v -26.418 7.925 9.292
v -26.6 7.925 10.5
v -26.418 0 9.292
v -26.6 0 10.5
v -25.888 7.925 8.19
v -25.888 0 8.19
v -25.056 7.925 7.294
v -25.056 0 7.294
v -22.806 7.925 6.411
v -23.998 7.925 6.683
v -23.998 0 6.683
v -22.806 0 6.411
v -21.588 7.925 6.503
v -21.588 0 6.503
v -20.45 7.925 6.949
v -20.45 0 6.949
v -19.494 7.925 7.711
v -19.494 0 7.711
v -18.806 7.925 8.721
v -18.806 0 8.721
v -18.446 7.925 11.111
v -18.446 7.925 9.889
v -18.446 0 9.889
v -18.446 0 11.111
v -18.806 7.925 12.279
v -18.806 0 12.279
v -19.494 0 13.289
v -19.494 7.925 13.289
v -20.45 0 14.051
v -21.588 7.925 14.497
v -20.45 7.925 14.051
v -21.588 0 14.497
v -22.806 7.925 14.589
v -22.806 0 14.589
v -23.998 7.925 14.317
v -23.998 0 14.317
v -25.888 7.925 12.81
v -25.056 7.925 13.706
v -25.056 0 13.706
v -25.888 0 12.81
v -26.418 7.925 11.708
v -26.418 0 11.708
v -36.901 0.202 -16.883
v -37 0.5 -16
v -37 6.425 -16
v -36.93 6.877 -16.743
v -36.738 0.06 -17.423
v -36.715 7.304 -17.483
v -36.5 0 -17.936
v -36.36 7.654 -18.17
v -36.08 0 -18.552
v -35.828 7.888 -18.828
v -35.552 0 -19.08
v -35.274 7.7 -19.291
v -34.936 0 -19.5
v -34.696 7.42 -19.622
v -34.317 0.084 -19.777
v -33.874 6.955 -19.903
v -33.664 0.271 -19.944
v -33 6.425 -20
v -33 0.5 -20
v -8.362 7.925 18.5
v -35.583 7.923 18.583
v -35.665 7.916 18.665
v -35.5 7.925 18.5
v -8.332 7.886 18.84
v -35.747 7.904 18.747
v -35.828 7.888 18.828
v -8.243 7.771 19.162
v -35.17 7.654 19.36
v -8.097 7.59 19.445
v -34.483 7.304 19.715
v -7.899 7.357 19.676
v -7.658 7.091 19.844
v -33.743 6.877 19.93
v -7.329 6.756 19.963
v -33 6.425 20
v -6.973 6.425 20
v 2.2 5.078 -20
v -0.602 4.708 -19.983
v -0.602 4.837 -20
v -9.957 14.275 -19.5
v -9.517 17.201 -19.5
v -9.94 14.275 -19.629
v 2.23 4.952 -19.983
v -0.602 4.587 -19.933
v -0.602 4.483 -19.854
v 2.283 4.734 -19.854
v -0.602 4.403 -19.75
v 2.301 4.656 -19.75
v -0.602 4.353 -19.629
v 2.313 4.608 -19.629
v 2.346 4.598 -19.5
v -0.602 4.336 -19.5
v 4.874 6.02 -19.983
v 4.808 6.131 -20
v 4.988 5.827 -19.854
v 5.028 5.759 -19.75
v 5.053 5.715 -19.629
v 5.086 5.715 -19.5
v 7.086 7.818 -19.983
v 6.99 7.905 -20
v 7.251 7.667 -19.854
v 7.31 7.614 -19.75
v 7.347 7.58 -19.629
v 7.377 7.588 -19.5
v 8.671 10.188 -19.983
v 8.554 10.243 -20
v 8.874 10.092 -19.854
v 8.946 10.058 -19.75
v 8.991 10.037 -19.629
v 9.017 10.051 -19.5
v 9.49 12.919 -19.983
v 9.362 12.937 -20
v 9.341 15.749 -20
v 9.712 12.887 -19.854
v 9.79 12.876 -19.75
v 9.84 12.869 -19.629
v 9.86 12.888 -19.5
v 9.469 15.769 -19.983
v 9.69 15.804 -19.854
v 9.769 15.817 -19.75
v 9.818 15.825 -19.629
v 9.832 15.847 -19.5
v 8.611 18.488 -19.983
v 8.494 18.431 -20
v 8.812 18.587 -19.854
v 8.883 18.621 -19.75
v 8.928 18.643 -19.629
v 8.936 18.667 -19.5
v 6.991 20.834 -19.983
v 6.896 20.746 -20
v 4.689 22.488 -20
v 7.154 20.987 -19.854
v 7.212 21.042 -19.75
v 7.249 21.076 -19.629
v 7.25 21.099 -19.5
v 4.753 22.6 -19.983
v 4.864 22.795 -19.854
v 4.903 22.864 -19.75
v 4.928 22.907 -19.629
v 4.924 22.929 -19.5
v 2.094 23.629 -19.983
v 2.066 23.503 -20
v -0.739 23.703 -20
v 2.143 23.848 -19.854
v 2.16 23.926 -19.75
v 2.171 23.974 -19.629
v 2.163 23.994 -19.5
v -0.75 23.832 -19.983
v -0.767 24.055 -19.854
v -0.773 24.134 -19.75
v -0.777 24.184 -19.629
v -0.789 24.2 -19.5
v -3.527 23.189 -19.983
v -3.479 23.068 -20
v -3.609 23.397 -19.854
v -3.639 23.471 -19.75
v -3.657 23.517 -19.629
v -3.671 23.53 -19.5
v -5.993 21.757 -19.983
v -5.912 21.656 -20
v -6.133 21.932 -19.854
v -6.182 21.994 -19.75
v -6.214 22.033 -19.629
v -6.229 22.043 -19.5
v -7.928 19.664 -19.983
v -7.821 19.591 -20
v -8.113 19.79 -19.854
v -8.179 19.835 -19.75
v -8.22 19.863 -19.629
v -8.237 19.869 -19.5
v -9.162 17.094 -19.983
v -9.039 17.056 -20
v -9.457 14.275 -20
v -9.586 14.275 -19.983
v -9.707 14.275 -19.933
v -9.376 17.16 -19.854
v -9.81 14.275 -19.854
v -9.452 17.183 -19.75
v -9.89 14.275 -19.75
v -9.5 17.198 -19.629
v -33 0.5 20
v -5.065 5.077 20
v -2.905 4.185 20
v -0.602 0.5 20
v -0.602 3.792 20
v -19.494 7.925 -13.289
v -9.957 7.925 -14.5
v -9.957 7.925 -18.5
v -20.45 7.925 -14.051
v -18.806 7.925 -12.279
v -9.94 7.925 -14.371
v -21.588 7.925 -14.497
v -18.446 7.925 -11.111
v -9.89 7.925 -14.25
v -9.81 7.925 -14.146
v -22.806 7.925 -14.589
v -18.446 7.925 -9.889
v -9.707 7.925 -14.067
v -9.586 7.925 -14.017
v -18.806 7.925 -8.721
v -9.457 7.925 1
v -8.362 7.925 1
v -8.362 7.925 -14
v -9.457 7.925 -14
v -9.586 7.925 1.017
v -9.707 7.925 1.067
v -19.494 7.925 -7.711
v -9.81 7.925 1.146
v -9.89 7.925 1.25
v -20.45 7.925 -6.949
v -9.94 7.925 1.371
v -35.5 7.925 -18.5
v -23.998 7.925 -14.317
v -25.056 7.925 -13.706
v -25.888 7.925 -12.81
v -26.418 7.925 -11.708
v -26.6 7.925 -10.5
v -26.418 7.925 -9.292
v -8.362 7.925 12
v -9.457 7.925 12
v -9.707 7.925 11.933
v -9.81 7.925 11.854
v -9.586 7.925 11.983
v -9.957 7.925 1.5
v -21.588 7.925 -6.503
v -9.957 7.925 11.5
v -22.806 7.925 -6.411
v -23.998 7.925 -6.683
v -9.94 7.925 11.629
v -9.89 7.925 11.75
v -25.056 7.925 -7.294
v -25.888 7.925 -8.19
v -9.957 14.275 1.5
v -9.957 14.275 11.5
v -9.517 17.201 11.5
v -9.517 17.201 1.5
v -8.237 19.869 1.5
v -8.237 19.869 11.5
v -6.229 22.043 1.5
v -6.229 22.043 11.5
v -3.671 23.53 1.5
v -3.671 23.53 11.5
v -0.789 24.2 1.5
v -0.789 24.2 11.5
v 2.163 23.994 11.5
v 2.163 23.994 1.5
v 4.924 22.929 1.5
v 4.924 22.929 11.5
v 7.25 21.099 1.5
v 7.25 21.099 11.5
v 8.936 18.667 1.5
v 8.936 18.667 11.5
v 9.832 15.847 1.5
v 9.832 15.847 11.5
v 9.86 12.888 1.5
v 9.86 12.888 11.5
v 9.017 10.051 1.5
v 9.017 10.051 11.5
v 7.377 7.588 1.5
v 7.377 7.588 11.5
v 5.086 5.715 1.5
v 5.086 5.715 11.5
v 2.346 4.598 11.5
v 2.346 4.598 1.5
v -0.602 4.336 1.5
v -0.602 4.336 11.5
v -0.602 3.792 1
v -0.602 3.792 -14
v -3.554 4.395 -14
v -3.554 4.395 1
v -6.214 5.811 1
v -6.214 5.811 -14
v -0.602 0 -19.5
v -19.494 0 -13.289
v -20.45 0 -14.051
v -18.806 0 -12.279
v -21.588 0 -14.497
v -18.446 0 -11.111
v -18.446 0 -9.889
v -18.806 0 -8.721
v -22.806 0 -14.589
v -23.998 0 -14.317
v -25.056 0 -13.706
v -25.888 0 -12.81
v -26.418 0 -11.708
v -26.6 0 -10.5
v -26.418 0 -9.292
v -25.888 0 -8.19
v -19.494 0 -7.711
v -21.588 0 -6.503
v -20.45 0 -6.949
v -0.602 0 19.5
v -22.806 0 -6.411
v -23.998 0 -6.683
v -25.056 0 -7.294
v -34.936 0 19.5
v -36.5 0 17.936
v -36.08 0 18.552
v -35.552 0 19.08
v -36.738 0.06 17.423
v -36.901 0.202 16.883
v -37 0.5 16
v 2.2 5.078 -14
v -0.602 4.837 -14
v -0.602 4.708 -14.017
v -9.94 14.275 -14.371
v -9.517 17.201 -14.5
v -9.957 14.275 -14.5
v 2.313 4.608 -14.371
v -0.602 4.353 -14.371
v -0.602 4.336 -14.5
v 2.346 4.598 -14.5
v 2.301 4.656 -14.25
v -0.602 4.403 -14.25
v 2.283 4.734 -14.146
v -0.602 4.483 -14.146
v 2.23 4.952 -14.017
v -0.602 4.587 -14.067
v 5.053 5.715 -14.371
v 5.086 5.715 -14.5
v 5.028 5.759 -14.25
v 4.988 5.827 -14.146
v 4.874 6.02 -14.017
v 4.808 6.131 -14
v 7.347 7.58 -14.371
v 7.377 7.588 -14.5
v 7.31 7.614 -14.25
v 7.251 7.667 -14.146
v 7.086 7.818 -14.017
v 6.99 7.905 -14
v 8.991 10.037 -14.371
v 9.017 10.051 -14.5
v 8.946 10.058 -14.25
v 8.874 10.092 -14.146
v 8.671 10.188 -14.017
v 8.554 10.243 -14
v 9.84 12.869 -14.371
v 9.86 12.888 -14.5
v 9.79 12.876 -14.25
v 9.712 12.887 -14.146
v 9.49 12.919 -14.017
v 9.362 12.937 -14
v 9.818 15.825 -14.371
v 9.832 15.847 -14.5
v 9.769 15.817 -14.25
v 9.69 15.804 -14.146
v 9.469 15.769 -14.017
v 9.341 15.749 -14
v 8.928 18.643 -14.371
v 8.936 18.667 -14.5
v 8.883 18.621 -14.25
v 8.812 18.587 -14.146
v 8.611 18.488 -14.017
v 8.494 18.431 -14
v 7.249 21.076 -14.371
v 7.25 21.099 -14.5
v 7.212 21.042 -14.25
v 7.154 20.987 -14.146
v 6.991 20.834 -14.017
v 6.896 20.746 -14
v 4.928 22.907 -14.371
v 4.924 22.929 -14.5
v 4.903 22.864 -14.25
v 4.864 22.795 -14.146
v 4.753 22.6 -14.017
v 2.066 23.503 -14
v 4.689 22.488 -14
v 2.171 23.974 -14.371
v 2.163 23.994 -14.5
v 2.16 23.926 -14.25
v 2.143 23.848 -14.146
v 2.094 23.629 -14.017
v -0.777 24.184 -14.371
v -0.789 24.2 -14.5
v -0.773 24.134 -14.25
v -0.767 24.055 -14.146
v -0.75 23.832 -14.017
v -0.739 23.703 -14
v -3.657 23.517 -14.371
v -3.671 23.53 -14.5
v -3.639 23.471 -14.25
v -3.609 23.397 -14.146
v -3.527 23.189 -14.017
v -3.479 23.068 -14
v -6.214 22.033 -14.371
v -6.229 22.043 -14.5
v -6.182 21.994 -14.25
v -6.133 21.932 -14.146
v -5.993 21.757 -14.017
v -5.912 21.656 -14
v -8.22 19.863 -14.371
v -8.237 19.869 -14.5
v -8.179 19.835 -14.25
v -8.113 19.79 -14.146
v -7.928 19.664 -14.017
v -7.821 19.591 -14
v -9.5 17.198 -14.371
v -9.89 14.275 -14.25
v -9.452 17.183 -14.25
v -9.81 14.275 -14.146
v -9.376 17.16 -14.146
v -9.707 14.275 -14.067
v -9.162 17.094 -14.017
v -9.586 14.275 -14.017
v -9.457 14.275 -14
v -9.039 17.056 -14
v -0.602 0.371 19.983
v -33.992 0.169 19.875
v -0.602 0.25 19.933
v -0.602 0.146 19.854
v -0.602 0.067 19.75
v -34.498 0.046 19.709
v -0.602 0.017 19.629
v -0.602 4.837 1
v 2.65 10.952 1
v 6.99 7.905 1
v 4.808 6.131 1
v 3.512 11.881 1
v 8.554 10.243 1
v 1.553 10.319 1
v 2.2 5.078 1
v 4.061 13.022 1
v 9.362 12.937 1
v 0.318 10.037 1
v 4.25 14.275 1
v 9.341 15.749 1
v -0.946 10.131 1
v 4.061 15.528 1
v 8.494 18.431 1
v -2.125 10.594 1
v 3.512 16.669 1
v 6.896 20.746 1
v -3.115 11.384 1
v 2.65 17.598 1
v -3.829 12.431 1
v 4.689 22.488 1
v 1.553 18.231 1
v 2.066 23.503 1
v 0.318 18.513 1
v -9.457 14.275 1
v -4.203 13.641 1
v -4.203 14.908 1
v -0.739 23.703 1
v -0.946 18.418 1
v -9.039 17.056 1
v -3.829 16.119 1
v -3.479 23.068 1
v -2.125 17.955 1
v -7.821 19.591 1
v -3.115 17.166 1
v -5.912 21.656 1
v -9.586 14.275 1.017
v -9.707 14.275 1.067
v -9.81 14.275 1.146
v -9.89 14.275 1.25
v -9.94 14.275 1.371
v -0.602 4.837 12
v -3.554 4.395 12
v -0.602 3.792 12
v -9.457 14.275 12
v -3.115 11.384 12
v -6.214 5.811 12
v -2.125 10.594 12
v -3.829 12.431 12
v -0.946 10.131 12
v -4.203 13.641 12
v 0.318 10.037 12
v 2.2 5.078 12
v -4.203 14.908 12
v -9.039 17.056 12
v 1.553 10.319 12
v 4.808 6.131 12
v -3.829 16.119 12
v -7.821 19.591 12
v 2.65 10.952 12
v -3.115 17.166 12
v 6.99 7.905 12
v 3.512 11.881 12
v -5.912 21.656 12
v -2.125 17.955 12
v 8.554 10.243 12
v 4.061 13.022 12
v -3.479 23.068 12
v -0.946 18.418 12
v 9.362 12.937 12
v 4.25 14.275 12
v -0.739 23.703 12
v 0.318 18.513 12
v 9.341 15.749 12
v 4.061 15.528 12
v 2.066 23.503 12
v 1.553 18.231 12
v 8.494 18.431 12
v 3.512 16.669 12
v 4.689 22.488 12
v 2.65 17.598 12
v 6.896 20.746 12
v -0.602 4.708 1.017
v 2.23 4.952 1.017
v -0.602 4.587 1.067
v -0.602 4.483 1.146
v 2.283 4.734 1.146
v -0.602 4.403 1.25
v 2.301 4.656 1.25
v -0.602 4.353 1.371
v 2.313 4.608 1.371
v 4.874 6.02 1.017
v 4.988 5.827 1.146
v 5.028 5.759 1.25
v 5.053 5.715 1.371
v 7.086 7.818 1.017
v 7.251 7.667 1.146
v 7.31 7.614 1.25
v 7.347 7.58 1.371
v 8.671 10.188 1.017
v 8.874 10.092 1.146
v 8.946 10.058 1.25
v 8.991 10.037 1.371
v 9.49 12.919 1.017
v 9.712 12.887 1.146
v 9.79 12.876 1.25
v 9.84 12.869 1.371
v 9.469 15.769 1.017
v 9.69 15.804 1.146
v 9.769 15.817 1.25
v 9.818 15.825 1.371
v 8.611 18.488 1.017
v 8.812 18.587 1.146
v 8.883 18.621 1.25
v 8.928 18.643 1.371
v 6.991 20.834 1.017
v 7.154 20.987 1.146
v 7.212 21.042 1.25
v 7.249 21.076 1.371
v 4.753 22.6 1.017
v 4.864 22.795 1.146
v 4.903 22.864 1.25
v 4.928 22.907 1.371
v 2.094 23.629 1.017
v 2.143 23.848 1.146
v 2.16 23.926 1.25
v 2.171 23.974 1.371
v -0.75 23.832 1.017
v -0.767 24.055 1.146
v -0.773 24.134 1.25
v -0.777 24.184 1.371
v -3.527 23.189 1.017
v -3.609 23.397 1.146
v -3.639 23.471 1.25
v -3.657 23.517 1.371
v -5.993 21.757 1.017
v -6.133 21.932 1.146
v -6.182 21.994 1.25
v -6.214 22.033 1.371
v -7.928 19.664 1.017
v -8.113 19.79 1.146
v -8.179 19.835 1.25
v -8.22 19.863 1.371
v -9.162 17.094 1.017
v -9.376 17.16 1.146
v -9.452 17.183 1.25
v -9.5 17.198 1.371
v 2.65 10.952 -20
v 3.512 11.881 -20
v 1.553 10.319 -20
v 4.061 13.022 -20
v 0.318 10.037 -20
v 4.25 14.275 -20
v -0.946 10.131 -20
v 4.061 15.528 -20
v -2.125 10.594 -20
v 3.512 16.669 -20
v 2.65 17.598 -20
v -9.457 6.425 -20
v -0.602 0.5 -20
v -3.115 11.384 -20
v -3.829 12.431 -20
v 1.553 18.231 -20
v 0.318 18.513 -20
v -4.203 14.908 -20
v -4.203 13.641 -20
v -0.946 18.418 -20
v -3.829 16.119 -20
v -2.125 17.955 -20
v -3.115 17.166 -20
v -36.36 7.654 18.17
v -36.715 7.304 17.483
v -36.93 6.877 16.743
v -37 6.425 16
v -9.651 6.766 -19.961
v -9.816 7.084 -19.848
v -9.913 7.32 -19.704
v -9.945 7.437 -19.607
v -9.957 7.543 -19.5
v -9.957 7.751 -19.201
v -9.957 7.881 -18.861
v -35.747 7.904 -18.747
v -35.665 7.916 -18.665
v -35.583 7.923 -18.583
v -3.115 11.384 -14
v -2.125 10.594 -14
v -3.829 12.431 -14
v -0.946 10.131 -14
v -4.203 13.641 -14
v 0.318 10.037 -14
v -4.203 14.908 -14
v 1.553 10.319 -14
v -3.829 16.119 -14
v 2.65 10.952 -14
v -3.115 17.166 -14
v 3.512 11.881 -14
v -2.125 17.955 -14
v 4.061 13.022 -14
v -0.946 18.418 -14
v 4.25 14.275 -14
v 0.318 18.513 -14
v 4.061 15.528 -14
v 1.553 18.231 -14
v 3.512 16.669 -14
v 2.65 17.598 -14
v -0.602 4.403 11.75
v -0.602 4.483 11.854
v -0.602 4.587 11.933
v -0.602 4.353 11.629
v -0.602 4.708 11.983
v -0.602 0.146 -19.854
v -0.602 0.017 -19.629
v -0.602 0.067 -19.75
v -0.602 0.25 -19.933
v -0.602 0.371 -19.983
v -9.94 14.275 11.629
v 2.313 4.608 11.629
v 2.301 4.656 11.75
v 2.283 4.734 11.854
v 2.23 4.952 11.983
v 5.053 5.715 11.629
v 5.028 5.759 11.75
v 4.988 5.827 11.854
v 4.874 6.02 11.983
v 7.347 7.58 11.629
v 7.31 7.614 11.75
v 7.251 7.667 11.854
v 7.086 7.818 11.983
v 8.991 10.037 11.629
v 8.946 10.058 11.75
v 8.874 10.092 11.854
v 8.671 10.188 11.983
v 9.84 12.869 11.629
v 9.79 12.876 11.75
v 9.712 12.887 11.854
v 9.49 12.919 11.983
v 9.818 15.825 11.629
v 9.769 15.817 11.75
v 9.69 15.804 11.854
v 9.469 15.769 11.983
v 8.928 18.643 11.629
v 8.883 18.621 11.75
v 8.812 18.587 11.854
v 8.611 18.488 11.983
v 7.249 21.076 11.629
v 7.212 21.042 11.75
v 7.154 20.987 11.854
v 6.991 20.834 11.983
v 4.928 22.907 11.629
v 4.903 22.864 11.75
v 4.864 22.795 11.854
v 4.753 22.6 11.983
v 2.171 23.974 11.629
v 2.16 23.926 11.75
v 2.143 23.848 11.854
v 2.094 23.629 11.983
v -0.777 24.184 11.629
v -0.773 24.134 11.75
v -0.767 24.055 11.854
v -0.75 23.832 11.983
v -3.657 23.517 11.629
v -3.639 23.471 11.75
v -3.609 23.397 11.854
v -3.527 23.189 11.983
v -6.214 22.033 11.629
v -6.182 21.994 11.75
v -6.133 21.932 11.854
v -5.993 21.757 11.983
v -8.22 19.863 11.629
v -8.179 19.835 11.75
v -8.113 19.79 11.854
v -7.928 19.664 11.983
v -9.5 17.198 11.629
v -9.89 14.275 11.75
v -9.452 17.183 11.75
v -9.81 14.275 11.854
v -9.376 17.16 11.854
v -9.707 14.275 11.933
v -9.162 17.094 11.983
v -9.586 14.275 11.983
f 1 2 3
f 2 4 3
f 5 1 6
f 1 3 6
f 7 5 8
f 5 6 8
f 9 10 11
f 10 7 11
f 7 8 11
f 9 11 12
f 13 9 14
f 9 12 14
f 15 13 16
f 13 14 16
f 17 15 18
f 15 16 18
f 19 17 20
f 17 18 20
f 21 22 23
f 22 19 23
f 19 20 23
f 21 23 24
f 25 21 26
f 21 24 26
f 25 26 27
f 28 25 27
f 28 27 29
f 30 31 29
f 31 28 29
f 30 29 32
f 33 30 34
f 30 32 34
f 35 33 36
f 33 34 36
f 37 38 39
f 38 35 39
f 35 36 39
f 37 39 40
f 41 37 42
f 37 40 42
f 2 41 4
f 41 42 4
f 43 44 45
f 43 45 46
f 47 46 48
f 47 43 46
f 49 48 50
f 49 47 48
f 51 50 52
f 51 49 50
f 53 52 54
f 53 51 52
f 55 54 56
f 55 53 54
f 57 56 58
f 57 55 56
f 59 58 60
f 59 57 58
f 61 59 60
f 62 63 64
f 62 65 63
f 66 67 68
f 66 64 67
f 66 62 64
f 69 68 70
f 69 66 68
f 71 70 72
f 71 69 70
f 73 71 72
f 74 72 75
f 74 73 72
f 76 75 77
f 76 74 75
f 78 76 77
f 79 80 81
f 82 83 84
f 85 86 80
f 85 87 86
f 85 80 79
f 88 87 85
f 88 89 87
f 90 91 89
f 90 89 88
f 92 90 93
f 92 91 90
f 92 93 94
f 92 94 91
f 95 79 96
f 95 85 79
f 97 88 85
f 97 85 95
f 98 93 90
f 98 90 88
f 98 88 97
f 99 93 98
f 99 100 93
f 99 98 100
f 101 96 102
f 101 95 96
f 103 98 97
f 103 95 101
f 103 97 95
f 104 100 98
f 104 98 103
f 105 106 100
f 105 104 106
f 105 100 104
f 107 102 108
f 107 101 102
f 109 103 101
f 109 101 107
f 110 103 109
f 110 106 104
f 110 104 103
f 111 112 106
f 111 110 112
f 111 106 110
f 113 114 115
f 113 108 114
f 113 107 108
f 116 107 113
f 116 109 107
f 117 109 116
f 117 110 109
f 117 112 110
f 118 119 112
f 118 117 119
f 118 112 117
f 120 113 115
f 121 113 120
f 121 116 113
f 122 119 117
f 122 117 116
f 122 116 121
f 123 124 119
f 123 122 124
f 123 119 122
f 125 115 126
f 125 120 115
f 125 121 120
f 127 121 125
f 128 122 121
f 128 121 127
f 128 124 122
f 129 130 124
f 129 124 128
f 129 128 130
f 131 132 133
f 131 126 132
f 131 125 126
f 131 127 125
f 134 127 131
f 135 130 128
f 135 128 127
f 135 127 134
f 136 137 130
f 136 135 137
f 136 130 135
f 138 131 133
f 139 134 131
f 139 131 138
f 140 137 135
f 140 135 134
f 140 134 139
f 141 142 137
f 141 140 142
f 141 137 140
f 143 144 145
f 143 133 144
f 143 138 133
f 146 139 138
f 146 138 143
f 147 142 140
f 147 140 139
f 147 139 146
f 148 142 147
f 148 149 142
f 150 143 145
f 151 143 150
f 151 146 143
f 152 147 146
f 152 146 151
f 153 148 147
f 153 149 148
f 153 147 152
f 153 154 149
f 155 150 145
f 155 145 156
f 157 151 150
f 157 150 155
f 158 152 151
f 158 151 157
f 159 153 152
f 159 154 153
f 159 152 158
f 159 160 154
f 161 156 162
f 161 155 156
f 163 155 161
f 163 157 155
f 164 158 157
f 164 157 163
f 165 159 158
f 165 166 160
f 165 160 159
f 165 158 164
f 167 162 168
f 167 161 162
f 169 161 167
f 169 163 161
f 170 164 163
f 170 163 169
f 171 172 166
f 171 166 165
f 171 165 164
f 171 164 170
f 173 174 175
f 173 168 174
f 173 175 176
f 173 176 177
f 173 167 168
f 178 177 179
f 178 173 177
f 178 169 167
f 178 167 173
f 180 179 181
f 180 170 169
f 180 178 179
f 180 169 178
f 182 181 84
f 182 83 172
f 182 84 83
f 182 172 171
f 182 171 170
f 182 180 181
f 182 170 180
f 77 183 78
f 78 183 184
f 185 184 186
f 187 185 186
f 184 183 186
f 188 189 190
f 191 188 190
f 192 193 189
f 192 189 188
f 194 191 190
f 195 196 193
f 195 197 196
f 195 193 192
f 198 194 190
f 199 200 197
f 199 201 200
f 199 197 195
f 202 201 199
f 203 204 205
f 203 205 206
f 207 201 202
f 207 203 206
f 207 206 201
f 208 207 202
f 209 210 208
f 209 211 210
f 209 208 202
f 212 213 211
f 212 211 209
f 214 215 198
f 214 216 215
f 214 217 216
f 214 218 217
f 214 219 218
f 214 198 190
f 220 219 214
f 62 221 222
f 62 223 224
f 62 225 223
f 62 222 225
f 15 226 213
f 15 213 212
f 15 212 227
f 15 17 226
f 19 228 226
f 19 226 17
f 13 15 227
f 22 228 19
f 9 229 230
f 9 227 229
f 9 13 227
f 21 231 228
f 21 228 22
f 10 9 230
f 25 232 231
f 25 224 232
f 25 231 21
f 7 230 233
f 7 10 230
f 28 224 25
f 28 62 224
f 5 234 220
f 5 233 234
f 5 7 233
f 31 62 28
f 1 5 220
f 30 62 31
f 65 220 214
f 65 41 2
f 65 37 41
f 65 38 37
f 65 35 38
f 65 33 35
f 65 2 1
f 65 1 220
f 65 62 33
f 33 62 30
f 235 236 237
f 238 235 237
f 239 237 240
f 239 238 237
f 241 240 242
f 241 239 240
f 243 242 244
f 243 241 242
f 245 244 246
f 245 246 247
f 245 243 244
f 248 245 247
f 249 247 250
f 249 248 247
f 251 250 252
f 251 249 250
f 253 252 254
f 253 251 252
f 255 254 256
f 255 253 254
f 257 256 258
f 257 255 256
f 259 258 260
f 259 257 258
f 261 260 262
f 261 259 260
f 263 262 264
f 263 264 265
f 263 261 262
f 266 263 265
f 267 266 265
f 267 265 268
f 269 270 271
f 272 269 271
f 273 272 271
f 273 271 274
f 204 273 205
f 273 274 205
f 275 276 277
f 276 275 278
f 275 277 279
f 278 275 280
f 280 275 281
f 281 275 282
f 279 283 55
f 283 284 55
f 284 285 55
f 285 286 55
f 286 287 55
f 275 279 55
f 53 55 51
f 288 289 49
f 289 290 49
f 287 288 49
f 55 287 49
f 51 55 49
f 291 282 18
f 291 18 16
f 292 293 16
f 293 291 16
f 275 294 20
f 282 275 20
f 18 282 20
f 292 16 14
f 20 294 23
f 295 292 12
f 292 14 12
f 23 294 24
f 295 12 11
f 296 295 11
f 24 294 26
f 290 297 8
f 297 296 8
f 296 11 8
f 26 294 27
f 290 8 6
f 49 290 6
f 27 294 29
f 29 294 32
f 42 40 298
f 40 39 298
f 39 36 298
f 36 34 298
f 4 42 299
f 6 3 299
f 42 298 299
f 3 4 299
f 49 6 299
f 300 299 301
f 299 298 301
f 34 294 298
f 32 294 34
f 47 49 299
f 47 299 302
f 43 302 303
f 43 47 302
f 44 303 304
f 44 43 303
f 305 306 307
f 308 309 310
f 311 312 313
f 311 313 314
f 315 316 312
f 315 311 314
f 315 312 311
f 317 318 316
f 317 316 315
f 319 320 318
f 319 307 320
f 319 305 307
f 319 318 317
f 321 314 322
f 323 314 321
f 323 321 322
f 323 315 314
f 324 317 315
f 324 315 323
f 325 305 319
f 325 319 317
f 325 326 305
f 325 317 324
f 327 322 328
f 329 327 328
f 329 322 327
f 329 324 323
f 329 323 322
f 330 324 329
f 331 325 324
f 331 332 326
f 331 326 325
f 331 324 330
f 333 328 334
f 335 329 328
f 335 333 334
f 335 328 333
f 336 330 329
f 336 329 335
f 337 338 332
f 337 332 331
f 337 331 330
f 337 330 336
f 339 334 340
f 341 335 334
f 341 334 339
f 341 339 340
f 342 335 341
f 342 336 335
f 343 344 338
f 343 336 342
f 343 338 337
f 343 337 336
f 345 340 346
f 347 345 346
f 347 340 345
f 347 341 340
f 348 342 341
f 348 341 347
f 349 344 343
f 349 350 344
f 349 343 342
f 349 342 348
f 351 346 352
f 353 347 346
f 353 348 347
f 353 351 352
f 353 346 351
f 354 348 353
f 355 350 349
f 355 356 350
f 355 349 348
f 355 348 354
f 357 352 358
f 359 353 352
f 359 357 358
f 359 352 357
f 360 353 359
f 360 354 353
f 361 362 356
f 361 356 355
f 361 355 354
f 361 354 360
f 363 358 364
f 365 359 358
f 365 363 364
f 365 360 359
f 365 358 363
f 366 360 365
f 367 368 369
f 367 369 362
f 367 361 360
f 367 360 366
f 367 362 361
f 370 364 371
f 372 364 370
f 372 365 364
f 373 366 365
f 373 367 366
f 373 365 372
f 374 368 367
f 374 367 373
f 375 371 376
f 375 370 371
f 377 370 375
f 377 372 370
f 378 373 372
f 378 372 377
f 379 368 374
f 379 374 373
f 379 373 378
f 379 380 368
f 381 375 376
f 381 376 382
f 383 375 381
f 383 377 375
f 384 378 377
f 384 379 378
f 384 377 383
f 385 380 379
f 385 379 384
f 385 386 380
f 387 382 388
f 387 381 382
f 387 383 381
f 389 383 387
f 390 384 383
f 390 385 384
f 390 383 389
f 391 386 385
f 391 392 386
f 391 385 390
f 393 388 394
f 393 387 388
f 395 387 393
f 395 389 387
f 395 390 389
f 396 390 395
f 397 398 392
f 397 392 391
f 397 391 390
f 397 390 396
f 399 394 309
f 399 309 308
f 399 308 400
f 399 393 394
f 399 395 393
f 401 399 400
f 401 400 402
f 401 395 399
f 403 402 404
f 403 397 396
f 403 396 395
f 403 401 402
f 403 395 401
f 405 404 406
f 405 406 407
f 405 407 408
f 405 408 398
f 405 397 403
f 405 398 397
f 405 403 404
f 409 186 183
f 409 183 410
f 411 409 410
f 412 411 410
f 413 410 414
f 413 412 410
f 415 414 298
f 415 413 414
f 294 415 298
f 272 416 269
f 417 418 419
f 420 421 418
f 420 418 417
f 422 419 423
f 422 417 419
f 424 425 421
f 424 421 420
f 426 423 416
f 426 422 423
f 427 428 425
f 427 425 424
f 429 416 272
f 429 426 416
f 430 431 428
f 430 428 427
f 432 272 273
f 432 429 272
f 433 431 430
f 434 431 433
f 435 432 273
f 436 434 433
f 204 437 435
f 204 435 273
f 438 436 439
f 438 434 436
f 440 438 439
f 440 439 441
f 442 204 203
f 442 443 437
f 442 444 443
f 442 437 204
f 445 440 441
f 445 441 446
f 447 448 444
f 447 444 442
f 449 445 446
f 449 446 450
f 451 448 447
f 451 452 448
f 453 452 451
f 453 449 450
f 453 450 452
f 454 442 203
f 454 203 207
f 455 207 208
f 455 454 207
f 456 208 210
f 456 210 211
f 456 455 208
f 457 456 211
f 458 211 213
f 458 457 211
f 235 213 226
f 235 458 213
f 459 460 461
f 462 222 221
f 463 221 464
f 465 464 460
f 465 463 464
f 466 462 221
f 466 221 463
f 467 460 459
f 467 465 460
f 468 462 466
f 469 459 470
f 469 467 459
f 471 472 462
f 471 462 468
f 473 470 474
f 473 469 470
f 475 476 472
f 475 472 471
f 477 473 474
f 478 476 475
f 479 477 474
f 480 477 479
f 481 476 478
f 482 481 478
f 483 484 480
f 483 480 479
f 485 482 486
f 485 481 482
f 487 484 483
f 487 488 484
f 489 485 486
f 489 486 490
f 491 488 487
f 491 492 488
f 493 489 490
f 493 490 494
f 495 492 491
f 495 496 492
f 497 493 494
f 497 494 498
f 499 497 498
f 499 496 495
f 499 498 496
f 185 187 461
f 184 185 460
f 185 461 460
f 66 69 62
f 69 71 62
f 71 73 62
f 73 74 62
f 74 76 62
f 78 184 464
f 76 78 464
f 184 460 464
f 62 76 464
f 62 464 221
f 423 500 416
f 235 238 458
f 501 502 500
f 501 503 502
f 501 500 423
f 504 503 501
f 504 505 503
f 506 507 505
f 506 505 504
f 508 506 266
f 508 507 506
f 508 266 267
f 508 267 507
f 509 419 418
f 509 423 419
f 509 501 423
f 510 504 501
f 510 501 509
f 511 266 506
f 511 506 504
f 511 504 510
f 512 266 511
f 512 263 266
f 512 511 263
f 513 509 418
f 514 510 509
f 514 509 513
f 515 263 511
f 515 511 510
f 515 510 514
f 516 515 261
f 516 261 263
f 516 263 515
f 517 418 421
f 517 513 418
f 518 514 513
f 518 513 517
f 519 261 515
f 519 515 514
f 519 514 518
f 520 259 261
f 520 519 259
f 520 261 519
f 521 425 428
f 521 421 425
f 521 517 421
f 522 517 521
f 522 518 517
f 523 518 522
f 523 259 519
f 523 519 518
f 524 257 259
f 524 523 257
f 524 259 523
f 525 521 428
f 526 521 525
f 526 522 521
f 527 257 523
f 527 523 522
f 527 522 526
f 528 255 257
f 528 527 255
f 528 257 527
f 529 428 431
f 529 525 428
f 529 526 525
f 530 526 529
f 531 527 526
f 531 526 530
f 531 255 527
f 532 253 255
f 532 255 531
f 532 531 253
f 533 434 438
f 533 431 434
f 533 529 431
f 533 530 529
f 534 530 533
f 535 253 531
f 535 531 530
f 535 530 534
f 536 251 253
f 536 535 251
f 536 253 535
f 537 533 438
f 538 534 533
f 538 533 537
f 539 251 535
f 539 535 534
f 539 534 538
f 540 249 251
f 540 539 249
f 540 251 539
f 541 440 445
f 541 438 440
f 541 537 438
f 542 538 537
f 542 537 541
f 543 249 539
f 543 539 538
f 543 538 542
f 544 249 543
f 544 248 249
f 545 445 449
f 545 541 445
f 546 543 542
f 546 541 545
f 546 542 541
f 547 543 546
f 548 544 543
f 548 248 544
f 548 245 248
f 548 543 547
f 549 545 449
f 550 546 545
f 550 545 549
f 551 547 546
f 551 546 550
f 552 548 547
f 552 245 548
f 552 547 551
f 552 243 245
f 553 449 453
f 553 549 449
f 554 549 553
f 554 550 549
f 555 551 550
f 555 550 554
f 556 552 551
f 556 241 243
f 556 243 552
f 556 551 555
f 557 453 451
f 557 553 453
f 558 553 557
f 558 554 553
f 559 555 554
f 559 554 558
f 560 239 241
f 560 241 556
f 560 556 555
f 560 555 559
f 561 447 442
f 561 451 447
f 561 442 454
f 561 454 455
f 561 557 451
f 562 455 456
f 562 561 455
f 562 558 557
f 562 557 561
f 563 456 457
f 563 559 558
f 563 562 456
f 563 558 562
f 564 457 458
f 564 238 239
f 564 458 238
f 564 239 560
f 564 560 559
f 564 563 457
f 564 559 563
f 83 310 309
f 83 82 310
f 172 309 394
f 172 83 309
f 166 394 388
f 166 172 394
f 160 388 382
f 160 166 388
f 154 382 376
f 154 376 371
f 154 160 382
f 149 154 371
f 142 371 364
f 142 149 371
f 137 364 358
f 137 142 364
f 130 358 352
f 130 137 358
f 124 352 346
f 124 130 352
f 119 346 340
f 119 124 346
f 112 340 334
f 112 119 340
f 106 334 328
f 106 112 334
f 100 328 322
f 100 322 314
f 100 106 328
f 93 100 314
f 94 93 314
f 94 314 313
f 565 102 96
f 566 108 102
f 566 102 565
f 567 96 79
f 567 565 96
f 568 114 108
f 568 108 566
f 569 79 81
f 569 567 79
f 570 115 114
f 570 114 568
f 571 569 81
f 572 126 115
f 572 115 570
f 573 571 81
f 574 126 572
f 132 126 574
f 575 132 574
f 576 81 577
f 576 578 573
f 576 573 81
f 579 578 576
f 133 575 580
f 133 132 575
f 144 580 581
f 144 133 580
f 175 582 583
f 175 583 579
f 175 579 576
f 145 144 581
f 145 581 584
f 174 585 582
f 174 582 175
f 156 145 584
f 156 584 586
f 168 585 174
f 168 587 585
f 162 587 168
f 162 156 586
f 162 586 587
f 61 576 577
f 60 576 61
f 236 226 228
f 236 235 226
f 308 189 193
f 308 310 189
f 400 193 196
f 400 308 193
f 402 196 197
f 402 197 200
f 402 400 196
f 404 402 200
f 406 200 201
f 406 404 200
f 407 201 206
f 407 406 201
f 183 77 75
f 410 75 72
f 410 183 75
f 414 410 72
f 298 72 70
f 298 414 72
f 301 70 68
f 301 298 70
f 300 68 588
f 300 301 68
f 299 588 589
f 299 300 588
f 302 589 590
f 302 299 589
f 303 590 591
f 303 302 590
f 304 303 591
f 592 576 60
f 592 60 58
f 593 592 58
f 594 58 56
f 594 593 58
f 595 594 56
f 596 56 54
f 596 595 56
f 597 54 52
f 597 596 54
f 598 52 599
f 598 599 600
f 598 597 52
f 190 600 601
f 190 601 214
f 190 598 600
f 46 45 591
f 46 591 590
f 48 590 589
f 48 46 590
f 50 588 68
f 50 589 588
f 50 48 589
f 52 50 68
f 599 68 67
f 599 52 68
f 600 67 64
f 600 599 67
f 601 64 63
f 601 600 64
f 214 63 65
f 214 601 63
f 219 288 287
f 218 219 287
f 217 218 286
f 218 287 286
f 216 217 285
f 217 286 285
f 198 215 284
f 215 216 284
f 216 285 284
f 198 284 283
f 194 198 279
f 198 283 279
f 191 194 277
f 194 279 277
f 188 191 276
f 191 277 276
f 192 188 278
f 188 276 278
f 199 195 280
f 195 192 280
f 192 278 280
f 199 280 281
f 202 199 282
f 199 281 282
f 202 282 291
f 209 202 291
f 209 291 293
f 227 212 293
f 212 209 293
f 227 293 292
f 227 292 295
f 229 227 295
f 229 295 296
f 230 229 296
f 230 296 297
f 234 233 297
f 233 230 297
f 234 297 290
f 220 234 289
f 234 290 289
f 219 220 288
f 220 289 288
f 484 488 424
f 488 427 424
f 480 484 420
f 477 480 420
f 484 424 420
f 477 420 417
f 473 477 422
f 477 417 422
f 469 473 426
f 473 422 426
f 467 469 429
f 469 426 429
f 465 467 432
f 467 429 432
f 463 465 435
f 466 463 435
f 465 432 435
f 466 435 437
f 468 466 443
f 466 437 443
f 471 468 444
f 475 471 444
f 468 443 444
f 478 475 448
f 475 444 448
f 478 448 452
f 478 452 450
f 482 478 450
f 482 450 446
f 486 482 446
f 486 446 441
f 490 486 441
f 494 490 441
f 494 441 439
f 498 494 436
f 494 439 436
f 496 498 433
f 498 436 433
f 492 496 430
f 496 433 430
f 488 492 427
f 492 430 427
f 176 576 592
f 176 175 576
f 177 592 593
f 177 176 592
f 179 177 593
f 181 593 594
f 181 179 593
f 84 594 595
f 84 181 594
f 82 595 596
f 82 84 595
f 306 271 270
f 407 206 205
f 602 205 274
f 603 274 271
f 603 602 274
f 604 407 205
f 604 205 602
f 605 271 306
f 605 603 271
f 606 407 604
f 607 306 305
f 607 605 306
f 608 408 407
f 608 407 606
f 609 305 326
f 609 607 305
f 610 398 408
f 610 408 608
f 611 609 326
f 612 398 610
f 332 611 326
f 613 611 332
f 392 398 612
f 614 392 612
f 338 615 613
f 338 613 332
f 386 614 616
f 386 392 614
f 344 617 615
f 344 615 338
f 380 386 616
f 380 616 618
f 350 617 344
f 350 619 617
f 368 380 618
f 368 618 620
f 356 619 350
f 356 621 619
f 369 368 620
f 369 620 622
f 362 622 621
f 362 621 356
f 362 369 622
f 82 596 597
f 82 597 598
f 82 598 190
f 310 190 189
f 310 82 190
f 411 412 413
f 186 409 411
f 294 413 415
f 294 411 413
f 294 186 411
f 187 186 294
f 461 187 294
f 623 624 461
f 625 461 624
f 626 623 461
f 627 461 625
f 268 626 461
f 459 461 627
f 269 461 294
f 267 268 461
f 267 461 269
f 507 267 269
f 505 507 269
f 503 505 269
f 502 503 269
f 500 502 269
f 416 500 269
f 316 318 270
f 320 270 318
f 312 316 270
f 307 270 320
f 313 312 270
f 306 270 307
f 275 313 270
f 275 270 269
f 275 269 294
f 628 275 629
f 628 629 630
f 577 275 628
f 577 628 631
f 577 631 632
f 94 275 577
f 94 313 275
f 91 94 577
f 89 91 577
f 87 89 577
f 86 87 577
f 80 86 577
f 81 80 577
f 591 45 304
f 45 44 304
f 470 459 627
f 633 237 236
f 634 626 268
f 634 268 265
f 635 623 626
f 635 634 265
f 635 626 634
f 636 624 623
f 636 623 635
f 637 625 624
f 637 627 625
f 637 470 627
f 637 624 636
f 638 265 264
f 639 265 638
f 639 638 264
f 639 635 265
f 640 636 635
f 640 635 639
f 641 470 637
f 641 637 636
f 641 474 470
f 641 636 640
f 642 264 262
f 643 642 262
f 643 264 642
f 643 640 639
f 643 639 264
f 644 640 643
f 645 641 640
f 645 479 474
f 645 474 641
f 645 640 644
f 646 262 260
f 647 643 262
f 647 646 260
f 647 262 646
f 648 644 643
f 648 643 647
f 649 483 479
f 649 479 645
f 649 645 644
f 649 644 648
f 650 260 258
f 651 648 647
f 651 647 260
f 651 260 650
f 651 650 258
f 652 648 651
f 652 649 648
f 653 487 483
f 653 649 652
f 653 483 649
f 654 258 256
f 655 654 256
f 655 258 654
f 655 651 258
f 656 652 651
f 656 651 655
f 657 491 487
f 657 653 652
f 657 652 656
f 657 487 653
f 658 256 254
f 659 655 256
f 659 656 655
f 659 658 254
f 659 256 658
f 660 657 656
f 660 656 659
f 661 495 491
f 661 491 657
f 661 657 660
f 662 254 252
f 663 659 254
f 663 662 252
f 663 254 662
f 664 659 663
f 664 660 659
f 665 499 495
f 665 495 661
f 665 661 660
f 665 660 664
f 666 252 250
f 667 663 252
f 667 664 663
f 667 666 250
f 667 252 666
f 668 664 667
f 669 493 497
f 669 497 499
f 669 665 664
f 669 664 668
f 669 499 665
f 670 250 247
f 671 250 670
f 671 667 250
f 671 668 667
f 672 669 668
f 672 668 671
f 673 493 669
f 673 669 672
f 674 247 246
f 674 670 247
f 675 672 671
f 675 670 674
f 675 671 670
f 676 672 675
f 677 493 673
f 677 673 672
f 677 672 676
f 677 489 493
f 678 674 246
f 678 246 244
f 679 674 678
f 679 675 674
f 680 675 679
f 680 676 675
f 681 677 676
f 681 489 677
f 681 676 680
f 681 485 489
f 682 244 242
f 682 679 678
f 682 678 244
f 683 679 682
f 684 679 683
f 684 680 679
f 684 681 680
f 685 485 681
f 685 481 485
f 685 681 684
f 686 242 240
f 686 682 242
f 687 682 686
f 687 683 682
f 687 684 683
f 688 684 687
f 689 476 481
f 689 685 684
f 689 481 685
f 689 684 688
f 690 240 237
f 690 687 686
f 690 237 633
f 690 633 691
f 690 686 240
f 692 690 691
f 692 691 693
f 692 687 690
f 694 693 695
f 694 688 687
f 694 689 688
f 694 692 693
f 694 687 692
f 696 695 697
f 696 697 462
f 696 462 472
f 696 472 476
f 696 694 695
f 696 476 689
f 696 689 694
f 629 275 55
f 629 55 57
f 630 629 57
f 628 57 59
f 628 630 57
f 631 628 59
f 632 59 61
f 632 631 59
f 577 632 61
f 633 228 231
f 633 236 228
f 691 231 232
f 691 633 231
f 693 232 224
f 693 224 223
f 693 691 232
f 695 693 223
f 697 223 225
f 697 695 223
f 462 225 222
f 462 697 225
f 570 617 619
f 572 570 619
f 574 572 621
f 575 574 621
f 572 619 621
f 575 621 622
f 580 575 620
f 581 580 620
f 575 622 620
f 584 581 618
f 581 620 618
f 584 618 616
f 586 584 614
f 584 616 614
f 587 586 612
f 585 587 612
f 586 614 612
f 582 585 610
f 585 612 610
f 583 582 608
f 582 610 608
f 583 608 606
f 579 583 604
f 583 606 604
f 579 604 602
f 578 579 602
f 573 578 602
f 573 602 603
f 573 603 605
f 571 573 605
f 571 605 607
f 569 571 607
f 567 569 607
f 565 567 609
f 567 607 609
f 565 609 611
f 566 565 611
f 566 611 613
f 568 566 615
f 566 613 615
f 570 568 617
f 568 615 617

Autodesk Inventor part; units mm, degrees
sketch "Sketch_1" plane through (0, 0, 0) normal (0, 1, 0) x (-1, 0, 0)
  arc A0 (37, 16) -> (33, 20) centre (33, 16) ccw
  line L0 (33, 20) -> (0.6018, 20)
  line L1 (0.6018, 20) -> (0.6018, -20)
  line L2 (0.6018, -20) -> (33, -20)
  arc A1 (33, -20) -> (37, -16) centre (33, -16) ccw
  line L3 (37, -16) -> (37, 16)
  circle A2 centre (22.5, 10.5) radius 4.1
  circle A3 centre (22.5, -10.5) radius 4.1
extrude "Extrusion1" add sketch "Sketch_1" along normal blind 7.9248
sketch "Sketch_2" plane through (0, 0, 0) normal (0, 0, 1) x (1, 0, 0)
  line L0 (-74, 15.8496) -> (-74, -7.9248)
  line L1 (-74, -7.9248) -> (37, -7.9248)
  line L2 (37, -7.9248) -> (37, 15.8496)
  line L3 (37, 15.8496) -> (-74, 15.8496)
  arc A0 (-37, 0.5) -> (-36.5, 0) centre (-36.5, 0.5) ccw
  line L4 (-36.5, 0) -> (-0.6, 0)
  line L5 (-0.6, 0) -> (-0.6, 7.9248)
  line L6 (-0.6, 7.9248) -> (-35.5, 7.9248)
  arc A1 (-35.5, 7.9248) -> (-37, 6.4248) centre (-35.5, 6.4248) ccw
  line L7 (-37, 6.4248) -> (-37, 0.5)
extrude "Extrusion2" cut sketch "Sketch_2" along normal mid plane 40
sketch "Sketch_3" plane through (0, 0, 0) normal (1, 0, 0) x (0, 1, 0)
  line L0 (15.8496, 40) -> (-7.9248, 40)
  line L1 (-7.9248, 40) -> (-7.9248, -40)
  line L2 (-7.9248, -40) -> (15.8496, -40)
  line L3 (15.8496, -40) -> (15.8496, 40)
  arc A0 (0.5, 20) -> (0, 19.5) centre (0.5, 19.5) ccw
  line L4 (0, 19.5) -> (0, -19.5)
  arc A1 (0, -19.5) -> (0.5, -20) centre (0.5, -19.5) ccw
  line L5 (0.5, -20) -> (6.4248, -20)
  arc A2 (6.4248, -20) -> (7.9248, -18.5) centre (6.4248, -18.5) ccw
  line L6 (7.9248, -18.5) -> (7.9248, 18.5)
  arc A3 (7.9248, 18.5) -> (6.4248, 20) centre (6.4248, 18.5) ccw
  line L7 (6.4248, 20) -> (0.5, 20)
extrude "Extrusion3" cut sketch "Sketch_3" against normal blind 74
sketch "Sketch_4" plane through (0, 0, 0) normal (0, 0, 1) x (1, 0, 0)
  circle A0 centre (0, 14.2748) radius 10.5
extrude "Extrusion4" cut sketch "Sketch_4" along normal mid plane 40
sketch "Sketch_5" plane through (0, 14.2748, 0) normal (0, 1, 0) x (1, 0, 0)
  arc A0 (-9.9568, -11.5) -> (-9.4568, -12) centre (-9.4568, -11.5) ccw
  line L0 (-9.4568, -12) -> (-0.6018, -12)
  line L1 (-0.6018, -12) -> (-0.6018, -1)
  line L2 (-0.6018, -1) -> (-9.4568, -1)
  arc A1 (-9.4568, -1) -> (-9.9568, -1.5) centre (-9.4568, -1.5) ccw
  line L3 (-9.9568, -1.5) -> (-9.9568, -11.5)
extrude "Extrusion5" add sketch "Sketch_5" against normal blind 11.7348
sketch "Sketch_6" plane through (0, 14.2748, 0) normal (0, 1, 0) x (1, 0, 0)
  line L0 (0, -1) -> (0, -12)
  line L1 (0, -12) -> (-9.4568, -12)
  arc A0 (-9.9568, -11.5) -> (-9.4568, -12) centre (-9.4568, -11.5) ccw
  line L2 (-9.9568, -11.5) -> (-9.9568, -1.5)
  arc A1 (-9.4568, -1) -> (-9.9568, -1.5) centre (-9.4568, -1.5) ccw
  line L3 (-9.4568, -1) -> (0, -1)
  line L4 (0, -1) -> (0, -12)
revolve "Revolution1" add sketch "Sketch_6" angle 360 about axis through (0, 14.2748, 1) along (0, 0, -1)
sketch "Sketch_7" plane through (0, 14.2748, 0) normal (0, 1, 0) x (1, 0, 0)
  arc A0 (-9.9568, 14.5) -> (-9.4568, 14) centre (-9.4568, 14.5) ccw
  line L0 (-9.4568, 14) -> (-0.6018, 14)
  line L1 (-0.6018, 14) -> (-0.6018, 20)
  line L2 (-0.6018, 20) -> (-9.4568, 20)
  arc A1 (-9.4568, 20) -> (-9.9568, 19.5) centre (-9.4568, 19.5) ccw
  line L3 (-9.9568, 19.5) -> (-9.9568, 14.5)
extrude "Extrusion6" add sketch "Sketch_7" against normal blind 11.7348
sketch "Sketch_8" plane through (0, 14.2748, 0) normal (0, 1, 0) x (1, 0, 0)
  line L0 (0, 20) -> (0, 14)
  line L1 (0, 14) -> (-9.4568, 14)
  arc A0 (-9.9568, 14.5) -> (-9.4568, 14) centre (-9.4568, 14.5) ccw
  line L2 (-9.9568, 14.5) -> (-9.9568, 19.5)
  arc A1 (-9.4568, 20) -> (-9.9568, 19.5) centre (-9.4568, 19.5) ccw
  line L3 (-9.4568, 20) -> (0, 20)
  line L4 (0, 20) -> (0, 14)
revolve "Revolution2" add sketch "Sketch_8" angle 360 about axis through (0, 14.2748, -20) along (0, 0, -1)
sketch "Sketch_9" plane through (0, 0, 0) normal (0, 0, 1) x (1, 0, 0)
  circle A0 centre (0, 14.2748) radius 4.25
extrude "Extrusion7" cut sketch "Sketch_9" along normal mid plane 40
ref_plane "to_b_XY" through (0, 14.2748, 0) normal (0, 0, -1) x (1, 0, 0)
ref_plane "to_b_YZ" through (0, 14.2748, 0) normal (1, 0, 0) x (0, -1, 0)
ref_plane "to_b_ZX" through (0, 14.2748, 0) normal (0, -1, 0) x (0, 0, -1)
ref_plane "to_pin_XY" through (0, 14.2748, 0) normal (0, 0, 1) x (1, 0, 0)
ref_plane "to_pin_YZ" through (0, 14.2748, 0) normal (1, 0, 0) x (0, 1, 0)
ref_plane "to_pin_ZX" through (0, 14.2748, 0) normal (0, 1, 0) x (0, 0, 1)
ref_plane "to_washer1_XY" through (0, 14.2748, 12.1745) normal (0, 0, -1) x (1, 0, 0)
ref_plane "to_washer1_YZ" through (0, 14.2748, 12.1745) normal (1, 0, 0) x (0, -1, 0)
ref_plane "to_washer1_ZX" through (0, 14.2748, 12.1745) normal (0, -1, 0) x (0, 0, -1)
ref_plane "to_washer2_XY" through (0, 14.2748, 0.8255) normal (0, 0, 1) x (1, 0, 0)
ref_plane "to_washer2_YZ" through (0, 14.2748, 0.8255) normal (1, 0, 0) x (0, 1, 0)
ref_plane "to_washer2_ZX" through (0, 14.2748, 0.8255) normal (0, 1, 0) x (0, 0, 1)
ref_plane "to_washer3_XY" through (0, 14.2748, -13.8255) normal (0, 0, -1) x (1, 0, 0)
ref_plane "to_washer3_YZ" through (0, 14.2748, -13.8255) normal (1, 0, 0) x (0, -1, 0)
ref_plane "to_washer3_ZX" through (0, 14.2748, -13.8255) normal (0, -1, 0) x (0, 0, -1)
properties part number "4489_a"
